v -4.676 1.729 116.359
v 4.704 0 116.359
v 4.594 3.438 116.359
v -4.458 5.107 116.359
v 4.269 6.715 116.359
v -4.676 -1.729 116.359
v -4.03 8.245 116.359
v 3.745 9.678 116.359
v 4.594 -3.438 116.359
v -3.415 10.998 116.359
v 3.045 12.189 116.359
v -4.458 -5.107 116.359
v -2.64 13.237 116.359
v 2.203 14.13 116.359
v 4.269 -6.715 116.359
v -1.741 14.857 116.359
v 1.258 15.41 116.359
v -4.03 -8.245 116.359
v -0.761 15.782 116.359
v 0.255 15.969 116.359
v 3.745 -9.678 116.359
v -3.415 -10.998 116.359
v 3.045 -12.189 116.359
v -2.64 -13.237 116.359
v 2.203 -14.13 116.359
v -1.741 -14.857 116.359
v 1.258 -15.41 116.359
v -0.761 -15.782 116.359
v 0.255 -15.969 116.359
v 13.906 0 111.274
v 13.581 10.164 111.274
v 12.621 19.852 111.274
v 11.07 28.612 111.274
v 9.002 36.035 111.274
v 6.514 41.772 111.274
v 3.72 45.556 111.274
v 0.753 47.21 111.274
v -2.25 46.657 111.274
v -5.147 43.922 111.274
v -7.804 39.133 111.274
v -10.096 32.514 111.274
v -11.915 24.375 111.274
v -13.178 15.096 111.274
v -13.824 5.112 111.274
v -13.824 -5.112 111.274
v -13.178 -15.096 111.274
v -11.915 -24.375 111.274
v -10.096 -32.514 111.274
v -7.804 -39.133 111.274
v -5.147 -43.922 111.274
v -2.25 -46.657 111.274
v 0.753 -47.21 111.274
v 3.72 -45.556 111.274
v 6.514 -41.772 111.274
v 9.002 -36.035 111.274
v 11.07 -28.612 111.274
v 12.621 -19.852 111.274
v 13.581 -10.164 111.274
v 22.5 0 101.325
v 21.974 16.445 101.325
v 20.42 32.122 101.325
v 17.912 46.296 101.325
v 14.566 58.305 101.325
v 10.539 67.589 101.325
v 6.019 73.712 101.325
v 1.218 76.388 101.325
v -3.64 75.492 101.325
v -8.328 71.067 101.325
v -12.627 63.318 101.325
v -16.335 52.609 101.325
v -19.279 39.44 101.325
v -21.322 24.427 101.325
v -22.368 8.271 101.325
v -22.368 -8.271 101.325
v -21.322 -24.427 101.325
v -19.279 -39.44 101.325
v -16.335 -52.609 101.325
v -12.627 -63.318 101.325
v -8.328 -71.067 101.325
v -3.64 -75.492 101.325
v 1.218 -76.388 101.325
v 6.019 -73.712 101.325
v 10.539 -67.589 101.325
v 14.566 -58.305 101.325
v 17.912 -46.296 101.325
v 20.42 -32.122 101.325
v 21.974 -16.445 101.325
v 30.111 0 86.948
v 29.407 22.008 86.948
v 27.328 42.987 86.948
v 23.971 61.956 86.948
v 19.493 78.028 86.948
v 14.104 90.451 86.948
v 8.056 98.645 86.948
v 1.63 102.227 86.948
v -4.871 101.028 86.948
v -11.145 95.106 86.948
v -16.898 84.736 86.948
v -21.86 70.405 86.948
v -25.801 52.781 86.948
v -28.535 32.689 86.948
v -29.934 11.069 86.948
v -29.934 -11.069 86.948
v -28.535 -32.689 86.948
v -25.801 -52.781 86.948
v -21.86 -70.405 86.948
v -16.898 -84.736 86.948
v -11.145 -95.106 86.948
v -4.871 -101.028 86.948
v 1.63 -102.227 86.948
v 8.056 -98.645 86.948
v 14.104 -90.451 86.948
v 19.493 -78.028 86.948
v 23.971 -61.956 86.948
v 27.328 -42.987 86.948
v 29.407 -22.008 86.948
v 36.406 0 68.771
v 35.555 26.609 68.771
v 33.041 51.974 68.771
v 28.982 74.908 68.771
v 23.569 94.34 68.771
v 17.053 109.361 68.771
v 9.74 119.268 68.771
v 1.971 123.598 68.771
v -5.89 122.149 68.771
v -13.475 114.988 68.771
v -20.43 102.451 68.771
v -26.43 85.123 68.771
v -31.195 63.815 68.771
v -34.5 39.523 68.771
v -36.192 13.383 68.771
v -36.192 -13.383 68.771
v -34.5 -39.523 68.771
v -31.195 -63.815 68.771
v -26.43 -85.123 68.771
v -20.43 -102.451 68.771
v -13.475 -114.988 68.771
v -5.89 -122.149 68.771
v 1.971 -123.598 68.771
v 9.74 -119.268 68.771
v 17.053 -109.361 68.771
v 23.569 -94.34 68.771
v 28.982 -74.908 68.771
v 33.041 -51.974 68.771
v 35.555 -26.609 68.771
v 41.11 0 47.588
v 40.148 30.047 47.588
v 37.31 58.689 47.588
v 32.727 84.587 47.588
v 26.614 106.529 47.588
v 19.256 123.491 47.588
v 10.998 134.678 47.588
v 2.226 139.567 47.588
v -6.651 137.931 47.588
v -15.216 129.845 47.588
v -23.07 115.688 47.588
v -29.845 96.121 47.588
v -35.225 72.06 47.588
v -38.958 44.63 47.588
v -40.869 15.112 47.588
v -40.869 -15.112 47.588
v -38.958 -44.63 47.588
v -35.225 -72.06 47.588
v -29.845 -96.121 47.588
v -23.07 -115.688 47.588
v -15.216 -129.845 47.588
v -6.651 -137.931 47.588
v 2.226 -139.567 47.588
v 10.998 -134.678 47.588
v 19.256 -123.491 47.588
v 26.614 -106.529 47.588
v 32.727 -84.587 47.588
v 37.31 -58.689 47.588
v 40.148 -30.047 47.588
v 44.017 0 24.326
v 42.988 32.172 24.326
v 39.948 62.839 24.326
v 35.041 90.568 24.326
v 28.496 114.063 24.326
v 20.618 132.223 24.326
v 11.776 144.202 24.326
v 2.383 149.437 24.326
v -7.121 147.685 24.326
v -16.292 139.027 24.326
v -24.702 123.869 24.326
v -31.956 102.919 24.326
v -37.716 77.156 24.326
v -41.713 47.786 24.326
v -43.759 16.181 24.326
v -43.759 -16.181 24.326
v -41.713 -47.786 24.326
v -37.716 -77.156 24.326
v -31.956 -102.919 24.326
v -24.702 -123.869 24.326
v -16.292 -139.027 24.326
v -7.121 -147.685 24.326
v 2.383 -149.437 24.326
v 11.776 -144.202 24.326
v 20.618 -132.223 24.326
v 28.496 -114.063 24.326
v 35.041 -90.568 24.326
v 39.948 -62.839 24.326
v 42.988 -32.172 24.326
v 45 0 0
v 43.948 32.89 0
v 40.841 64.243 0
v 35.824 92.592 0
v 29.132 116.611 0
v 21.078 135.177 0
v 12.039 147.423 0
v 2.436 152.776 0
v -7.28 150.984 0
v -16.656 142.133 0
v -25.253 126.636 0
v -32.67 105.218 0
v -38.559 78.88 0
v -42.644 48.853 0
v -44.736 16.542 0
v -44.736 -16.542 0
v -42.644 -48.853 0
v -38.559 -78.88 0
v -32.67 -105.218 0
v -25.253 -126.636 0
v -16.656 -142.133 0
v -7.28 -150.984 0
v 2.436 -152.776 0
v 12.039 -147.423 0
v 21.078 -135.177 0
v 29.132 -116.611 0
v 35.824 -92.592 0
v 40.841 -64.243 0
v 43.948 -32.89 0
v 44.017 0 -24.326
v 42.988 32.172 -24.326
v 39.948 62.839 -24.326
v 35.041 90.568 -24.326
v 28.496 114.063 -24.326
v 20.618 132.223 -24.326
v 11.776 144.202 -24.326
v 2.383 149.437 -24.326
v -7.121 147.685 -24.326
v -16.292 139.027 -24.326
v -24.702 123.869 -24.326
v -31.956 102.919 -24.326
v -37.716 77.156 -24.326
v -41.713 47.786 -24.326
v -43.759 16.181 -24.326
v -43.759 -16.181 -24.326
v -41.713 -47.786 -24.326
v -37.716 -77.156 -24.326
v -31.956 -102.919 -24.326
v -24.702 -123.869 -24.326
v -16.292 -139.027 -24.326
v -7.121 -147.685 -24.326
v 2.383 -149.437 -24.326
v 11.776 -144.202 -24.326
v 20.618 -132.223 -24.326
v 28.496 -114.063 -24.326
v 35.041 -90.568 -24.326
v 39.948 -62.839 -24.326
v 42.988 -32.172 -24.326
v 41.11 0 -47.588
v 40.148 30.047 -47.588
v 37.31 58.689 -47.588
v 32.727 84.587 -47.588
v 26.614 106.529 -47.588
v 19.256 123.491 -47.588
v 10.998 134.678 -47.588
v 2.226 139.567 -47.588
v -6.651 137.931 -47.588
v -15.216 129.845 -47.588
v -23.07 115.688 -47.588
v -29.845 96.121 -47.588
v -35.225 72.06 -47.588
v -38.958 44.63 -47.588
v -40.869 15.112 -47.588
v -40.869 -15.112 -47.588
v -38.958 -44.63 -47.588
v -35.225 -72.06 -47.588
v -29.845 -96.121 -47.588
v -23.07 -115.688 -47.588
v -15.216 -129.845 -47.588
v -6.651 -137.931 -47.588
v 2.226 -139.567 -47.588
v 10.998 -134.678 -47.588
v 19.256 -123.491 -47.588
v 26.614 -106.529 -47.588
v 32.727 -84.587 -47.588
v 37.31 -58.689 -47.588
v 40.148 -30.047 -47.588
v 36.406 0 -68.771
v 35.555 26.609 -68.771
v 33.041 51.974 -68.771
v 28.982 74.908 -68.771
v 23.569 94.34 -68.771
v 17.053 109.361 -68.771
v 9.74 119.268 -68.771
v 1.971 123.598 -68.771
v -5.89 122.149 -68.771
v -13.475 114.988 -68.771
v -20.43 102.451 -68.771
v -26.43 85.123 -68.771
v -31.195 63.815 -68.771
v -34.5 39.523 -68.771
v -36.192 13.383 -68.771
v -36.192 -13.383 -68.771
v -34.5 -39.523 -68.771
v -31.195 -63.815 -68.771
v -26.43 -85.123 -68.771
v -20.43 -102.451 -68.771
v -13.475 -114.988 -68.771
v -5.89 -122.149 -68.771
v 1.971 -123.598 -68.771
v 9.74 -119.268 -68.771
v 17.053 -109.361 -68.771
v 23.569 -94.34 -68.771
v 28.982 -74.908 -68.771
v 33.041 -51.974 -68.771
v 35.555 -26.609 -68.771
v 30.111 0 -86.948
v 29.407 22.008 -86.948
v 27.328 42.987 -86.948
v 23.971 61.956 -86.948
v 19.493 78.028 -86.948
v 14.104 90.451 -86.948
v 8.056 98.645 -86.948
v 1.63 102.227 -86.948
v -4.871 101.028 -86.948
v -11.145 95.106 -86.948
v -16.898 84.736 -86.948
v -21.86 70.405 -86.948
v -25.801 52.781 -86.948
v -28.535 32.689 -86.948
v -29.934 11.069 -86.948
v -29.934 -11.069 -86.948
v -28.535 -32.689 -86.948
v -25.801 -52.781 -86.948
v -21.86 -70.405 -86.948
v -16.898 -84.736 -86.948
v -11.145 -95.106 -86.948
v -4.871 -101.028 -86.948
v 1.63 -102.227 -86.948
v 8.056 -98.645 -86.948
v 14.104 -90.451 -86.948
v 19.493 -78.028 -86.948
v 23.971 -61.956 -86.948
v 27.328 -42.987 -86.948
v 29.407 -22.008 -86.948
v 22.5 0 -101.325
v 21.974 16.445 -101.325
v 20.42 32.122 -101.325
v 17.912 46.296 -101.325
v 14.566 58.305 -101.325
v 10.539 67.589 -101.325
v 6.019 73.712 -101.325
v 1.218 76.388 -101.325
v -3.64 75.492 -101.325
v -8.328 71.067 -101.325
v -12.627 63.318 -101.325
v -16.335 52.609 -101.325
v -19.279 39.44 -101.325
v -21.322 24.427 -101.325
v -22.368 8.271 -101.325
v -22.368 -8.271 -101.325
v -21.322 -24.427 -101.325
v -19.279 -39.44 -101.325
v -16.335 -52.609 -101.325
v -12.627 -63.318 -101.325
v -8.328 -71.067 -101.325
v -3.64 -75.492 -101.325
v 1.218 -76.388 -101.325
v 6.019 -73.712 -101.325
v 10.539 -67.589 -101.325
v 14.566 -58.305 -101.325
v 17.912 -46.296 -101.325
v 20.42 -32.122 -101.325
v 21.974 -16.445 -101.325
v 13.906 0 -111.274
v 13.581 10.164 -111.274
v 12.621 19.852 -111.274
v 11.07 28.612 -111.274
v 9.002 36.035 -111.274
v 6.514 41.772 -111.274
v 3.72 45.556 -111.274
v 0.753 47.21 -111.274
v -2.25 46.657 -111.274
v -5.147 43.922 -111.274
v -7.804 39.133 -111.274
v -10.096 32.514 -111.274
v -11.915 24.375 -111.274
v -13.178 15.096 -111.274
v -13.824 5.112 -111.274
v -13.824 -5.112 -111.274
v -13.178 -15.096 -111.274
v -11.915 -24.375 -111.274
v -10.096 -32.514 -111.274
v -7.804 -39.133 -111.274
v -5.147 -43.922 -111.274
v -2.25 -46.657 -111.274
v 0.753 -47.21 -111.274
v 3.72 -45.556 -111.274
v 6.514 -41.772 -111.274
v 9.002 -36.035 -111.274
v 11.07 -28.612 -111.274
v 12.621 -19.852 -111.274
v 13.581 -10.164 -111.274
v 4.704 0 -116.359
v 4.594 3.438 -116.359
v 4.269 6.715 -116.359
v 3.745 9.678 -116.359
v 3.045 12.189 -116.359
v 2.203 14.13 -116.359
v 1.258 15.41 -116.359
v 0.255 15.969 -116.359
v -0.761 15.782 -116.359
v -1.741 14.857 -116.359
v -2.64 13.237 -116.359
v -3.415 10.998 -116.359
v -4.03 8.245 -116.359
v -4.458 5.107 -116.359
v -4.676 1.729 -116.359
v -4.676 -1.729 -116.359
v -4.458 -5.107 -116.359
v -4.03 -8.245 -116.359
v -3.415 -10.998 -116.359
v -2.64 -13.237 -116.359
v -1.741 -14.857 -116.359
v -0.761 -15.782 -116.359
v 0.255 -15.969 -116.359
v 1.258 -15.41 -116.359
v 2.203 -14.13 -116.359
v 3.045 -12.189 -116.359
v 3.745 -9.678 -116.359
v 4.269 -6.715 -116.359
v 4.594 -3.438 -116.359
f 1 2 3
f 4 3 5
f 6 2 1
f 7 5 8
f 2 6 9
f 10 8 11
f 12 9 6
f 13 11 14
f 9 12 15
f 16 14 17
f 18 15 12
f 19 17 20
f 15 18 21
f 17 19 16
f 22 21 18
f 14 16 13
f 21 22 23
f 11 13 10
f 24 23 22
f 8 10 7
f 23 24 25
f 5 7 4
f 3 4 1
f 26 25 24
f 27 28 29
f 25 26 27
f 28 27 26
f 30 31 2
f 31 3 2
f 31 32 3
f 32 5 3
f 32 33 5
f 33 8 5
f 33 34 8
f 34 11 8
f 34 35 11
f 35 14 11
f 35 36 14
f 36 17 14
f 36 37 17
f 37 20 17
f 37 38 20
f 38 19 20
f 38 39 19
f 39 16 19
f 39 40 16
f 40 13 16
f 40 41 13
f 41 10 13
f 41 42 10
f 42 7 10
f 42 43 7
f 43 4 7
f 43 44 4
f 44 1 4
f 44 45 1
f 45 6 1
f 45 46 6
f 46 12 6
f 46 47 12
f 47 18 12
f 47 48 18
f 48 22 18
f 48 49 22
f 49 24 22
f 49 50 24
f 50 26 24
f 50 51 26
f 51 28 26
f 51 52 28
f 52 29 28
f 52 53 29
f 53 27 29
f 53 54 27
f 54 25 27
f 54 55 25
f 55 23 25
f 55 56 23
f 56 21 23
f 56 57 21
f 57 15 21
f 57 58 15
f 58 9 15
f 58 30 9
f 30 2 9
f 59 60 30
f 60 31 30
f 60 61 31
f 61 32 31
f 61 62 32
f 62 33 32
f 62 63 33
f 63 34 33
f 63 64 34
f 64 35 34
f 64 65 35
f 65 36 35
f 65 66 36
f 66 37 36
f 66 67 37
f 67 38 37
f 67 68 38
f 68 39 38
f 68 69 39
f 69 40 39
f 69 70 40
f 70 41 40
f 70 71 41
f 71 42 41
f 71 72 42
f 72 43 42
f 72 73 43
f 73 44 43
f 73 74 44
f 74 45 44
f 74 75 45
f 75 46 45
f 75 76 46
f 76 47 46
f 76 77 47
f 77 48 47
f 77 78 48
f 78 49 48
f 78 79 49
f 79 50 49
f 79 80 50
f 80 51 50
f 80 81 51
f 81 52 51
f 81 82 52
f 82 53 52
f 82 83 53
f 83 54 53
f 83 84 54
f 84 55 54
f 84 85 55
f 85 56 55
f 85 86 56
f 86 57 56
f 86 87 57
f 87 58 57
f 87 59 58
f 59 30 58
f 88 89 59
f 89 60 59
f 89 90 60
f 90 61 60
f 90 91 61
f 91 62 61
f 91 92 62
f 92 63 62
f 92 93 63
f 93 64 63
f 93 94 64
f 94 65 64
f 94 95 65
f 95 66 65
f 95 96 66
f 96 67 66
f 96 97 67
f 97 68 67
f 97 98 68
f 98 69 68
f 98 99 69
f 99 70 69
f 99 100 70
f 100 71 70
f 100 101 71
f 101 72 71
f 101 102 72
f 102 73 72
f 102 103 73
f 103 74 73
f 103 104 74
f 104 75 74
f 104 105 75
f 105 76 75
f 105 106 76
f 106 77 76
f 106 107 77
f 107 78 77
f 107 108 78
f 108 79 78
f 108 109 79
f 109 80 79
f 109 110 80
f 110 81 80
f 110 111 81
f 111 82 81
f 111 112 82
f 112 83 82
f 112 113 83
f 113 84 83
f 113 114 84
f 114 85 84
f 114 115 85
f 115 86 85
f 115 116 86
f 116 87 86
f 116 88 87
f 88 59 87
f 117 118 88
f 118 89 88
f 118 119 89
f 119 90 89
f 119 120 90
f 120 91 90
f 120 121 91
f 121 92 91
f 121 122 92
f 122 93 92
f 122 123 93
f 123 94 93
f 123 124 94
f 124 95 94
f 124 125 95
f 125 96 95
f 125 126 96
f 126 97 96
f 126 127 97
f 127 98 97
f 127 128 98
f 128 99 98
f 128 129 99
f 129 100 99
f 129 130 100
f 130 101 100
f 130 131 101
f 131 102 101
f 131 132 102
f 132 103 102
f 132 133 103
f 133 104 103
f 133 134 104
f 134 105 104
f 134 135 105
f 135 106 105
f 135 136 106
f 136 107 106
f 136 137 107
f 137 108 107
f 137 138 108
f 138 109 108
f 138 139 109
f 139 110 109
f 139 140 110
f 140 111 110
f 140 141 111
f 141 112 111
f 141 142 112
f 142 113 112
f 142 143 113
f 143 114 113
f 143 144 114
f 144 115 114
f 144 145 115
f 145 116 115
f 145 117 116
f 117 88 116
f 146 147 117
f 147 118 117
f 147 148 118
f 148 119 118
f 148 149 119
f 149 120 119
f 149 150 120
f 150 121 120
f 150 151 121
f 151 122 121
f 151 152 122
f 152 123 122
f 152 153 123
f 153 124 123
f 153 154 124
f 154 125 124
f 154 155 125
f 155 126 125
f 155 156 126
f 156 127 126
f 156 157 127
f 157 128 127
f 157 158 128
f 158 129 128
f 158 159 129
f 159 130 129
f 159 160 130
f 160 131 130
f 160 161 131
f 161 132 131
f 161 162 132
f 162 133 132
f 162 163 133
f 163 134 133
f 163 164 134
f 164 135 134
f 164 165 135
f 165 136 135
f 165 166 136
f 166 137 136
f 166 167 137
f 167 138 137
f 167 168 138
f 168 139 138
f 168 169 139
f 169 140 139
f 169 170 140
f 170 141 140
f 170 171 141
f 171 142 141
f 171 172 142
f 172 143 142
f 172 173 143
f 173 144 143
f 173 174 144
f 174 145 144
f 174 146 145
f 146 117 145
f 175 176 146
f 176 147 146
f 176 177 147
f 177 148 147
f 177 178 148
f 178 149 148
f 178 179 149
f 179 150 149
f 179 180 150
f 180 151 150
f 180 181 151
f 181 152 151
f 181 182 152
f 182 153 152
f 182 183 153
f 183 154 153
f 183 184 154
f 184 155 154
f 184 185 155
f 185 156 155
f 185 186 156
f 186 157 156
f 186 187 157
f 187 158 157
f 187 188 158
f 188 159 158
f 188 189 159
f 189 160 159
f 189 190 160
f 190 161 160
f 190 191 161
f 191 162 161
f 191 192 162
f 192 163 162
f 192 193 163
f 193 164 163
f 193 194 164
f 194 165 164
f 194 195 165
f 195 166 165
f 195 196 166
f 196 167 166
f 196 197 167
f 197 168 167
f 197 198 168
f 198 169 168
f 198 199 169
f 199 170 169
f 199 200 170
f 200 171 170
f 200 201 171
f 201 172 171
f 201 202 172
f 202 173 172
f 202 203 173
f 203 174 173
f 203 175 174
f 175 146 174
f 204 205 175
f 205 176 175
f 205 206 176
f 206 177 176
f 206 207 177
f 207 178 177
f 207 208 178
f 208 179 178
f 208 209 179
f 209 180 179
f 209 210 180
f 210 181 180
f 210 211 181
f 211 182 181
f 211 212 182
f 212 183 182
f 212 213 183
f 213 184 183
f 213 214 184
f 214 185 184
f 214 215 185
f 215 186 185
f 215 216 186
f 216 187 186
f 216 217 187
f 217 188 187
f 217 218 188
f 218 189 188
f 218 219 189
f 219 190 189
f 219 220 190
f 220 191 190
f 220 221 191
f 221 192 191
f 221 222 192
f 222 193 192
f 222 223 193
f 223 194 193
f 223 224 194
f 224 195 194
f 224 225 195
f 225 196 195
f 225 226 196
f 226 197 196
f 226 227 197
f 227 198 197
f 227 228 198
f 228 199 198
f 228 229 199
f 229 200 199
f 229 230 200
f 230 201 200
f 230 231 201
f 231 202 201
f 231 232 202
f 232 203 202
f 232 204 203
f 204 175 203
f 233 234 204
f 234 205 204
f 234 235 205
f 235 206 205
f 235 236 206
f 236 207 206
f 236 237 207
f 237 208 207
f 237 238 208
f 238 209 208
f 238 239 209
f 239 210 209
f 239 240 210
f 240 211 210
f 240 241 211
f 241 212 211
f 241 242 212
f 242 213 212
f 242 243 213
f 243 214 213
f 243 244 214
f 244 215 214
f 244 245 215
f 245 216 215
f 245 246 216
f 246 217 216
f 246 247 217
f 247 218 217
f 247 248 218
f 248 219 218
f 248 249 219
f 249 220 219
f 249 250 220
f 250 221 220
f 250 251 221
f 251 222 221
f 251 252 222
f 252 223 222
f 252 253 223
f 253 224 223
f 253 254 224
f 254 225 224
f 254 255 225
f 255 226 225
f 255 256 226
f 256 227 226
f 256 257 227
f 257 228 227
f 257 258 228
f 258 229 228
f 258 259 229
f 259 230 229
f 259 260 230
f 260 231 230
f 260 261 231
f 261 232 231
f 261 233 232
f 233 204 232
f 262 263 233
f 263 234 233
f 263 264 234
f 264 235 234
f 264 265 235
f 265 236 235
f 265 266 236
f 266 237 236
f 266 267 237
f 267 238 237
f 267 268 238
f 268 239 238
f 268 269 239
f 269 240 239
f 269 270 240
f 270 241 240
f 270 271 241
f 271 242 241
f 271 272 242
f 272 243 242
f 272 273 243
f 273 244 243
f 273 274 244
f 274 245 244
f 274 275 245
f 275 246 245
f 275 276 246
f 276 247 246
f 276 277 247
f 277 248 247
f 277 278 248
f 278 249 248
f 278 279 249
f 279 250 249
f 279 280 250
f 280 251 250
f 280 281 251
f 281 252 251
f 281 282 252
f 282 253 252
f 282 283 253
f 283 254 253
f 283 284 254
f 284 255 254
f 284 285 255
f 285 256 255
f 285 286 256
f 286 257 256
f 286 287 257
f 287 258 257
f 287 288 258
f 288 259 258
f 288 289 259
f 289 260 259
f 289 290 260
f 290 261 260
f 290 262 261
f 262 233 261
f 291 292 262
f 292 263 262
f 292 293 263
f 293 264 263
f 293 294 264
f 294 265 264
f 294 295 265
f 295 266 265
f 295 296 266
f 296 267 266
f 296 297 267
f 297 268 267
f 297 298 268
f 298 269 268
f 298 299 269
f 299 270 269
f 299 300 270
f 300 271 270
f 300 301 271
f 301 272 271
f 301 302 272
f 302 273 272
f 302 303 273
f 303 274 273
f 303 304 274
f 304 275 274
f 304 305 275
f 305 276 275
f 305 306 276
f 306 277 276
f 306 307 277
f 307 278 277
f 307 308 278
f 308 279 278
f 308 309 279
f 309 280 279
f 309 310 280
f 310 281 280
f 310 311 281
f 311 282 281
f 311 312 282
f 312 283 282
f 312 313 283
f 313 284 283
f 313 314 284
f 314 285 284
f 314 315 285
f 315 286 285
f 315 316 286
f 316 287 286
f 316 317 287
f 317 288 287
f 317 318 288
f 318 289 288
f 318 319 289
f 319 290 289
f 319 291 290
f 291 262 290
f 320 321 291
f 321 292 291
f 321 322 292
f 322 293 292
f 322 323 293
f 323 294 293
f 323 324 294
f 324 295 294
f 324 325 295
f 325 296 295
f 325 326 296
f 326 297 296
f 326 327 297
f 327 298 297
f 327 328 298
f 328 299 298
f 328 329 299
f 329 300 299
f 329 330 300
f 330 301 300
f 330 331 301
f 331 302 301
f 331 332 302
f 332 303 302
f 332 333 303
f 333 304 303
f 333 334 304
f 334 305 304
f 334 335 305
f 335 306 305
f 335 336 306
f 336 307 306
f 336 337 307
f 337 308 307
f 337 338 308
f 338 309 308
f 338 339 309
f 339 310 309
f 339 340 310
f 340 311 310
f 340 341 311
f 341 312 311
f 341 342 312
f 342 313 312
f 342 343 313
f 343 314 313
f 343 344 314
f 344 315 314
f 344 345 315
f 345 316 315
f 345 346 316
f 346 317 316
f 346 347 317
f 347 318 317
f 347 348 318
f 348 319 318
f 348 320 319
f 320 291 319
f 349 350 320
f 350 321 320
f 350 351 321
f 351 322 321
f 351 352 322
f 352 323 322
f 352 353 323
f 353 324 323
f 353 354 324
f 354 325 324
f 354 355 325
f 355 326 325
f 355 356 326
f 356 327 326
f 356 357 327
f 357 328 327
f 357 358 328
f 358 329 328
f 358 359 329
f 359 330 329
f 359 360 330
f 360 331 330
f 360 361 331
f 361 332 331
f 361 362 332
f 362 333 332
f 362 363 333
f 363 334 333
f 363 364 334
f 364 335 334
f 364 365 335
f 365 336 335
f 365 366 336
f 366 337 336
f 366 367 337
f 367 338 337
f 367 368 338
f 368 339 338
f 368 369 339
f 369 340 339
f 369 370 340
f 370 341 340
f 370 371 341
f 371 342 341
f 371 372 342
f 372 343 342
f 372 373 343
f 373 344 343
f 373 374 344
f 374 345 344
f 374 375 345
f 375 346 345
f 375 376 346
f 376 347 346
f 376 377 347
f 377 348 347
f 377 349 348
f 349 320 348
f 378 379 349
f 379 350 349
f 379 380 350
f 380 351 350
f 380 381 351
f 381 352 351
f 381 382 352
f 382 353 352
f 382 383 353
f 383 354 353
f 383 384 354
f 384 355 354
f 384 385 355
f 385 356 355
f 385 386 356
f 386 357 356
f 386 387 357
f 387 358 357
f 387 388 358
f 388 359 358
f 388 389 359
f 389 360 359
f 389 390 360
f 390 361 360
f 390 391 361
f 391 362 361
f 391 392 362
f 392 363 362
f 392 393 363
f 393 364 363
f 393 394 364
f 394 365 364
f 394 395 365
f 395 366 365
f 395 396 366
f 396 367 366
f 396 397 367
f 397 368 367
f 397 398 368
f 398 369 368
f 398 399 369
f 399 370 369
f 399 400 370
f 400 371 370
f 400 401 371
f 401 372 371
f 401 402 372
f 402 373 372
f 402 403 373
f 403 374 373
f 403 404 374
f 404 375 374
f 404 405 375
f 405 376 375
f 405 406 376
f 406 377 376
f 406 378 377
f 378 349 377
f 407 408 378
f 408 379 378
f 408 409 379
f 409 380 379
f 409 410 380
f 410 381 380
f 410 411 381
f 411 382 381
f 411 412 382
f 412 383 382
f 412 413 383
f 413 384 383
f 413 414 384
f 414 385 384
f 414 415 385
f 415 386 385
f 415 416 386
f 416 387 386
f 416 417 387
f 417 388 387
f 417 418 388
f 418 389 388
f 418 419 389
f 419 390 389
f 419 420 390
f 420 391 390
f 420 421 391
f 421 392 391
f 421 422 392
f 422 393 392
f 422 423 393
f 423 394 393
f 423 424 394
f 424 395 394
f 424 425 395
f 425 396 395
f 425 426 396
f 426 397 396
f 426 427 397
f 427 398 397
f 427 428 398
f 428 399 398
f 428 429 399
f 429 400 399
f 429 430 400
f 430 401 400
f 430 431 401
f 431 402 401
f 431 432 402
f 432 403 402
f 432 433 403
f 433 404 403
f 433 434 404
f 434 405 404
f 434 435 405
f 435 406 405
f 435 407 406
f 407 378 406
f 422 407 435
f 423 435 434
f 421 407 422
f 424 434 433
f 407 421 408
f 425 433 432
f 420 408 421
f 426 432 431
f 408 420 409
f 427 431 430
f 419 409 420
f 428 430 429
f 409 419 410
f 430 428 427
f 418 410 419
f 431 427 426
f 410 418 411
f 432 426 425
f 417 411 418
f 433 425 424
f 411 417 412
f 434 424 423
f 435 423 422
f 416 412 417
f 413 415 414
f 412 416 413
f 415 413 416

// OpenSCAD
// Generated by SolidPython 1.0.1 on 2020-07-29 00:46:47


scale(v = [5, 17, 13]) {
	sphere(r = 9);
}
/***********************************************
*********      SolidPython code:      **********
************************************************
 
# import packages: SolidPython
from solid import *
from solid.utils import *
from itertools import chain, combinations, permutations


class Resize:

    def __init__(self, scad_file):
        self.scad_file = scad_file
        #self.scad_file = import_scad(scad_file)
        # cone/cylinder param:
        self.r1 = 0
        self.r2 = 0
        self.h = 0
        # rectangular prism param:
        self.w = 0
        self.l = 0
        # ellipse param:
        self.r = 0

    # import OpenScad code (file name corresponds to shape)


    # classify shape + parameters
    def assign(self, param1, param2, param3):
        if self.scad_file == 'cone.scad':
            self.r1 = param1
            self.r2 = param2
            self.h = param3
        elif self.scad_file == 'cylinder.scad':
            self.r1 = param1
            self.r2 = param2
            self.h = param3
        elif self.scad_file == 'rectangularPrism.scad':
            self.h = param1
            self.l = param2
            self.w = param3
        else:
            self.r = param1
            self.h = param2

    # resize parameters
    def iterate(self):
        x = range(3, 20, 2)
        i = 1
        if self.scad_file == 'cone.scad':
            tempList = list(permutations(x, 2))
            for temp in tempList:
                param1 = temp[0]
                param2 = temp[1]
                filepath = 'produced_scad_files/' + 'cone' + str(param1) + '_' + str(param2) + '_' + '.scad'
                scad_render_to_file(cylinder(h=param1, r1=param2, r2=0), filepath)

        elif self.scad_file == 'cylinder.scad':
            tempList = list(permutations(x, 3))
            for temp in tempList:
                param1 = temp[0]
                param2 = temp[1]
                filepath = 'produced_scad_files/' + 'cylinder' + str(param1) + '_' + str(param2) + '_' + '.scad'
                scad_render_to_file(cylinder(h=param1, r1=param2, r2=param2), filepath)

        elif self.scad_file == 'rectangularPrism.scad':
            tempList = list(permutations(x, 3))
            for temp in tempList:
                param1 = temp[0]
                param2 = temp[1]
                param3 = temp[2]
                filepath = 'produced_scad_files/' + 'rectangularPrism' + str(param1) + '_' + str(param2) + '_' + str(
                    param3) + '.scad'
                scad_render_to_file(cube(size=(param1, param2, param3)), filepath)

        elif self.scad_file == 'ellipse.scad':
            tempList = list(permutations(x, 4))
            for temp in tempList:
                param1 = temp[0]
                param2 = temp[1]
                param3 = temp[2]
                param4 = temp[3]
                filepath = 'produced_scad_files/' + 'ellipse' + str(param1) + '_' + str(param2) + '_' + str(param3) + '_' + str(param4) + '.scad'
                scad_render_to_file(scale([param1, param2, param3])(sphere(r=param4)), filepath)

    def render_to_scadfile(self):
        scad_render_to_file(scad, 'example.scad') 
 
************************************************/
